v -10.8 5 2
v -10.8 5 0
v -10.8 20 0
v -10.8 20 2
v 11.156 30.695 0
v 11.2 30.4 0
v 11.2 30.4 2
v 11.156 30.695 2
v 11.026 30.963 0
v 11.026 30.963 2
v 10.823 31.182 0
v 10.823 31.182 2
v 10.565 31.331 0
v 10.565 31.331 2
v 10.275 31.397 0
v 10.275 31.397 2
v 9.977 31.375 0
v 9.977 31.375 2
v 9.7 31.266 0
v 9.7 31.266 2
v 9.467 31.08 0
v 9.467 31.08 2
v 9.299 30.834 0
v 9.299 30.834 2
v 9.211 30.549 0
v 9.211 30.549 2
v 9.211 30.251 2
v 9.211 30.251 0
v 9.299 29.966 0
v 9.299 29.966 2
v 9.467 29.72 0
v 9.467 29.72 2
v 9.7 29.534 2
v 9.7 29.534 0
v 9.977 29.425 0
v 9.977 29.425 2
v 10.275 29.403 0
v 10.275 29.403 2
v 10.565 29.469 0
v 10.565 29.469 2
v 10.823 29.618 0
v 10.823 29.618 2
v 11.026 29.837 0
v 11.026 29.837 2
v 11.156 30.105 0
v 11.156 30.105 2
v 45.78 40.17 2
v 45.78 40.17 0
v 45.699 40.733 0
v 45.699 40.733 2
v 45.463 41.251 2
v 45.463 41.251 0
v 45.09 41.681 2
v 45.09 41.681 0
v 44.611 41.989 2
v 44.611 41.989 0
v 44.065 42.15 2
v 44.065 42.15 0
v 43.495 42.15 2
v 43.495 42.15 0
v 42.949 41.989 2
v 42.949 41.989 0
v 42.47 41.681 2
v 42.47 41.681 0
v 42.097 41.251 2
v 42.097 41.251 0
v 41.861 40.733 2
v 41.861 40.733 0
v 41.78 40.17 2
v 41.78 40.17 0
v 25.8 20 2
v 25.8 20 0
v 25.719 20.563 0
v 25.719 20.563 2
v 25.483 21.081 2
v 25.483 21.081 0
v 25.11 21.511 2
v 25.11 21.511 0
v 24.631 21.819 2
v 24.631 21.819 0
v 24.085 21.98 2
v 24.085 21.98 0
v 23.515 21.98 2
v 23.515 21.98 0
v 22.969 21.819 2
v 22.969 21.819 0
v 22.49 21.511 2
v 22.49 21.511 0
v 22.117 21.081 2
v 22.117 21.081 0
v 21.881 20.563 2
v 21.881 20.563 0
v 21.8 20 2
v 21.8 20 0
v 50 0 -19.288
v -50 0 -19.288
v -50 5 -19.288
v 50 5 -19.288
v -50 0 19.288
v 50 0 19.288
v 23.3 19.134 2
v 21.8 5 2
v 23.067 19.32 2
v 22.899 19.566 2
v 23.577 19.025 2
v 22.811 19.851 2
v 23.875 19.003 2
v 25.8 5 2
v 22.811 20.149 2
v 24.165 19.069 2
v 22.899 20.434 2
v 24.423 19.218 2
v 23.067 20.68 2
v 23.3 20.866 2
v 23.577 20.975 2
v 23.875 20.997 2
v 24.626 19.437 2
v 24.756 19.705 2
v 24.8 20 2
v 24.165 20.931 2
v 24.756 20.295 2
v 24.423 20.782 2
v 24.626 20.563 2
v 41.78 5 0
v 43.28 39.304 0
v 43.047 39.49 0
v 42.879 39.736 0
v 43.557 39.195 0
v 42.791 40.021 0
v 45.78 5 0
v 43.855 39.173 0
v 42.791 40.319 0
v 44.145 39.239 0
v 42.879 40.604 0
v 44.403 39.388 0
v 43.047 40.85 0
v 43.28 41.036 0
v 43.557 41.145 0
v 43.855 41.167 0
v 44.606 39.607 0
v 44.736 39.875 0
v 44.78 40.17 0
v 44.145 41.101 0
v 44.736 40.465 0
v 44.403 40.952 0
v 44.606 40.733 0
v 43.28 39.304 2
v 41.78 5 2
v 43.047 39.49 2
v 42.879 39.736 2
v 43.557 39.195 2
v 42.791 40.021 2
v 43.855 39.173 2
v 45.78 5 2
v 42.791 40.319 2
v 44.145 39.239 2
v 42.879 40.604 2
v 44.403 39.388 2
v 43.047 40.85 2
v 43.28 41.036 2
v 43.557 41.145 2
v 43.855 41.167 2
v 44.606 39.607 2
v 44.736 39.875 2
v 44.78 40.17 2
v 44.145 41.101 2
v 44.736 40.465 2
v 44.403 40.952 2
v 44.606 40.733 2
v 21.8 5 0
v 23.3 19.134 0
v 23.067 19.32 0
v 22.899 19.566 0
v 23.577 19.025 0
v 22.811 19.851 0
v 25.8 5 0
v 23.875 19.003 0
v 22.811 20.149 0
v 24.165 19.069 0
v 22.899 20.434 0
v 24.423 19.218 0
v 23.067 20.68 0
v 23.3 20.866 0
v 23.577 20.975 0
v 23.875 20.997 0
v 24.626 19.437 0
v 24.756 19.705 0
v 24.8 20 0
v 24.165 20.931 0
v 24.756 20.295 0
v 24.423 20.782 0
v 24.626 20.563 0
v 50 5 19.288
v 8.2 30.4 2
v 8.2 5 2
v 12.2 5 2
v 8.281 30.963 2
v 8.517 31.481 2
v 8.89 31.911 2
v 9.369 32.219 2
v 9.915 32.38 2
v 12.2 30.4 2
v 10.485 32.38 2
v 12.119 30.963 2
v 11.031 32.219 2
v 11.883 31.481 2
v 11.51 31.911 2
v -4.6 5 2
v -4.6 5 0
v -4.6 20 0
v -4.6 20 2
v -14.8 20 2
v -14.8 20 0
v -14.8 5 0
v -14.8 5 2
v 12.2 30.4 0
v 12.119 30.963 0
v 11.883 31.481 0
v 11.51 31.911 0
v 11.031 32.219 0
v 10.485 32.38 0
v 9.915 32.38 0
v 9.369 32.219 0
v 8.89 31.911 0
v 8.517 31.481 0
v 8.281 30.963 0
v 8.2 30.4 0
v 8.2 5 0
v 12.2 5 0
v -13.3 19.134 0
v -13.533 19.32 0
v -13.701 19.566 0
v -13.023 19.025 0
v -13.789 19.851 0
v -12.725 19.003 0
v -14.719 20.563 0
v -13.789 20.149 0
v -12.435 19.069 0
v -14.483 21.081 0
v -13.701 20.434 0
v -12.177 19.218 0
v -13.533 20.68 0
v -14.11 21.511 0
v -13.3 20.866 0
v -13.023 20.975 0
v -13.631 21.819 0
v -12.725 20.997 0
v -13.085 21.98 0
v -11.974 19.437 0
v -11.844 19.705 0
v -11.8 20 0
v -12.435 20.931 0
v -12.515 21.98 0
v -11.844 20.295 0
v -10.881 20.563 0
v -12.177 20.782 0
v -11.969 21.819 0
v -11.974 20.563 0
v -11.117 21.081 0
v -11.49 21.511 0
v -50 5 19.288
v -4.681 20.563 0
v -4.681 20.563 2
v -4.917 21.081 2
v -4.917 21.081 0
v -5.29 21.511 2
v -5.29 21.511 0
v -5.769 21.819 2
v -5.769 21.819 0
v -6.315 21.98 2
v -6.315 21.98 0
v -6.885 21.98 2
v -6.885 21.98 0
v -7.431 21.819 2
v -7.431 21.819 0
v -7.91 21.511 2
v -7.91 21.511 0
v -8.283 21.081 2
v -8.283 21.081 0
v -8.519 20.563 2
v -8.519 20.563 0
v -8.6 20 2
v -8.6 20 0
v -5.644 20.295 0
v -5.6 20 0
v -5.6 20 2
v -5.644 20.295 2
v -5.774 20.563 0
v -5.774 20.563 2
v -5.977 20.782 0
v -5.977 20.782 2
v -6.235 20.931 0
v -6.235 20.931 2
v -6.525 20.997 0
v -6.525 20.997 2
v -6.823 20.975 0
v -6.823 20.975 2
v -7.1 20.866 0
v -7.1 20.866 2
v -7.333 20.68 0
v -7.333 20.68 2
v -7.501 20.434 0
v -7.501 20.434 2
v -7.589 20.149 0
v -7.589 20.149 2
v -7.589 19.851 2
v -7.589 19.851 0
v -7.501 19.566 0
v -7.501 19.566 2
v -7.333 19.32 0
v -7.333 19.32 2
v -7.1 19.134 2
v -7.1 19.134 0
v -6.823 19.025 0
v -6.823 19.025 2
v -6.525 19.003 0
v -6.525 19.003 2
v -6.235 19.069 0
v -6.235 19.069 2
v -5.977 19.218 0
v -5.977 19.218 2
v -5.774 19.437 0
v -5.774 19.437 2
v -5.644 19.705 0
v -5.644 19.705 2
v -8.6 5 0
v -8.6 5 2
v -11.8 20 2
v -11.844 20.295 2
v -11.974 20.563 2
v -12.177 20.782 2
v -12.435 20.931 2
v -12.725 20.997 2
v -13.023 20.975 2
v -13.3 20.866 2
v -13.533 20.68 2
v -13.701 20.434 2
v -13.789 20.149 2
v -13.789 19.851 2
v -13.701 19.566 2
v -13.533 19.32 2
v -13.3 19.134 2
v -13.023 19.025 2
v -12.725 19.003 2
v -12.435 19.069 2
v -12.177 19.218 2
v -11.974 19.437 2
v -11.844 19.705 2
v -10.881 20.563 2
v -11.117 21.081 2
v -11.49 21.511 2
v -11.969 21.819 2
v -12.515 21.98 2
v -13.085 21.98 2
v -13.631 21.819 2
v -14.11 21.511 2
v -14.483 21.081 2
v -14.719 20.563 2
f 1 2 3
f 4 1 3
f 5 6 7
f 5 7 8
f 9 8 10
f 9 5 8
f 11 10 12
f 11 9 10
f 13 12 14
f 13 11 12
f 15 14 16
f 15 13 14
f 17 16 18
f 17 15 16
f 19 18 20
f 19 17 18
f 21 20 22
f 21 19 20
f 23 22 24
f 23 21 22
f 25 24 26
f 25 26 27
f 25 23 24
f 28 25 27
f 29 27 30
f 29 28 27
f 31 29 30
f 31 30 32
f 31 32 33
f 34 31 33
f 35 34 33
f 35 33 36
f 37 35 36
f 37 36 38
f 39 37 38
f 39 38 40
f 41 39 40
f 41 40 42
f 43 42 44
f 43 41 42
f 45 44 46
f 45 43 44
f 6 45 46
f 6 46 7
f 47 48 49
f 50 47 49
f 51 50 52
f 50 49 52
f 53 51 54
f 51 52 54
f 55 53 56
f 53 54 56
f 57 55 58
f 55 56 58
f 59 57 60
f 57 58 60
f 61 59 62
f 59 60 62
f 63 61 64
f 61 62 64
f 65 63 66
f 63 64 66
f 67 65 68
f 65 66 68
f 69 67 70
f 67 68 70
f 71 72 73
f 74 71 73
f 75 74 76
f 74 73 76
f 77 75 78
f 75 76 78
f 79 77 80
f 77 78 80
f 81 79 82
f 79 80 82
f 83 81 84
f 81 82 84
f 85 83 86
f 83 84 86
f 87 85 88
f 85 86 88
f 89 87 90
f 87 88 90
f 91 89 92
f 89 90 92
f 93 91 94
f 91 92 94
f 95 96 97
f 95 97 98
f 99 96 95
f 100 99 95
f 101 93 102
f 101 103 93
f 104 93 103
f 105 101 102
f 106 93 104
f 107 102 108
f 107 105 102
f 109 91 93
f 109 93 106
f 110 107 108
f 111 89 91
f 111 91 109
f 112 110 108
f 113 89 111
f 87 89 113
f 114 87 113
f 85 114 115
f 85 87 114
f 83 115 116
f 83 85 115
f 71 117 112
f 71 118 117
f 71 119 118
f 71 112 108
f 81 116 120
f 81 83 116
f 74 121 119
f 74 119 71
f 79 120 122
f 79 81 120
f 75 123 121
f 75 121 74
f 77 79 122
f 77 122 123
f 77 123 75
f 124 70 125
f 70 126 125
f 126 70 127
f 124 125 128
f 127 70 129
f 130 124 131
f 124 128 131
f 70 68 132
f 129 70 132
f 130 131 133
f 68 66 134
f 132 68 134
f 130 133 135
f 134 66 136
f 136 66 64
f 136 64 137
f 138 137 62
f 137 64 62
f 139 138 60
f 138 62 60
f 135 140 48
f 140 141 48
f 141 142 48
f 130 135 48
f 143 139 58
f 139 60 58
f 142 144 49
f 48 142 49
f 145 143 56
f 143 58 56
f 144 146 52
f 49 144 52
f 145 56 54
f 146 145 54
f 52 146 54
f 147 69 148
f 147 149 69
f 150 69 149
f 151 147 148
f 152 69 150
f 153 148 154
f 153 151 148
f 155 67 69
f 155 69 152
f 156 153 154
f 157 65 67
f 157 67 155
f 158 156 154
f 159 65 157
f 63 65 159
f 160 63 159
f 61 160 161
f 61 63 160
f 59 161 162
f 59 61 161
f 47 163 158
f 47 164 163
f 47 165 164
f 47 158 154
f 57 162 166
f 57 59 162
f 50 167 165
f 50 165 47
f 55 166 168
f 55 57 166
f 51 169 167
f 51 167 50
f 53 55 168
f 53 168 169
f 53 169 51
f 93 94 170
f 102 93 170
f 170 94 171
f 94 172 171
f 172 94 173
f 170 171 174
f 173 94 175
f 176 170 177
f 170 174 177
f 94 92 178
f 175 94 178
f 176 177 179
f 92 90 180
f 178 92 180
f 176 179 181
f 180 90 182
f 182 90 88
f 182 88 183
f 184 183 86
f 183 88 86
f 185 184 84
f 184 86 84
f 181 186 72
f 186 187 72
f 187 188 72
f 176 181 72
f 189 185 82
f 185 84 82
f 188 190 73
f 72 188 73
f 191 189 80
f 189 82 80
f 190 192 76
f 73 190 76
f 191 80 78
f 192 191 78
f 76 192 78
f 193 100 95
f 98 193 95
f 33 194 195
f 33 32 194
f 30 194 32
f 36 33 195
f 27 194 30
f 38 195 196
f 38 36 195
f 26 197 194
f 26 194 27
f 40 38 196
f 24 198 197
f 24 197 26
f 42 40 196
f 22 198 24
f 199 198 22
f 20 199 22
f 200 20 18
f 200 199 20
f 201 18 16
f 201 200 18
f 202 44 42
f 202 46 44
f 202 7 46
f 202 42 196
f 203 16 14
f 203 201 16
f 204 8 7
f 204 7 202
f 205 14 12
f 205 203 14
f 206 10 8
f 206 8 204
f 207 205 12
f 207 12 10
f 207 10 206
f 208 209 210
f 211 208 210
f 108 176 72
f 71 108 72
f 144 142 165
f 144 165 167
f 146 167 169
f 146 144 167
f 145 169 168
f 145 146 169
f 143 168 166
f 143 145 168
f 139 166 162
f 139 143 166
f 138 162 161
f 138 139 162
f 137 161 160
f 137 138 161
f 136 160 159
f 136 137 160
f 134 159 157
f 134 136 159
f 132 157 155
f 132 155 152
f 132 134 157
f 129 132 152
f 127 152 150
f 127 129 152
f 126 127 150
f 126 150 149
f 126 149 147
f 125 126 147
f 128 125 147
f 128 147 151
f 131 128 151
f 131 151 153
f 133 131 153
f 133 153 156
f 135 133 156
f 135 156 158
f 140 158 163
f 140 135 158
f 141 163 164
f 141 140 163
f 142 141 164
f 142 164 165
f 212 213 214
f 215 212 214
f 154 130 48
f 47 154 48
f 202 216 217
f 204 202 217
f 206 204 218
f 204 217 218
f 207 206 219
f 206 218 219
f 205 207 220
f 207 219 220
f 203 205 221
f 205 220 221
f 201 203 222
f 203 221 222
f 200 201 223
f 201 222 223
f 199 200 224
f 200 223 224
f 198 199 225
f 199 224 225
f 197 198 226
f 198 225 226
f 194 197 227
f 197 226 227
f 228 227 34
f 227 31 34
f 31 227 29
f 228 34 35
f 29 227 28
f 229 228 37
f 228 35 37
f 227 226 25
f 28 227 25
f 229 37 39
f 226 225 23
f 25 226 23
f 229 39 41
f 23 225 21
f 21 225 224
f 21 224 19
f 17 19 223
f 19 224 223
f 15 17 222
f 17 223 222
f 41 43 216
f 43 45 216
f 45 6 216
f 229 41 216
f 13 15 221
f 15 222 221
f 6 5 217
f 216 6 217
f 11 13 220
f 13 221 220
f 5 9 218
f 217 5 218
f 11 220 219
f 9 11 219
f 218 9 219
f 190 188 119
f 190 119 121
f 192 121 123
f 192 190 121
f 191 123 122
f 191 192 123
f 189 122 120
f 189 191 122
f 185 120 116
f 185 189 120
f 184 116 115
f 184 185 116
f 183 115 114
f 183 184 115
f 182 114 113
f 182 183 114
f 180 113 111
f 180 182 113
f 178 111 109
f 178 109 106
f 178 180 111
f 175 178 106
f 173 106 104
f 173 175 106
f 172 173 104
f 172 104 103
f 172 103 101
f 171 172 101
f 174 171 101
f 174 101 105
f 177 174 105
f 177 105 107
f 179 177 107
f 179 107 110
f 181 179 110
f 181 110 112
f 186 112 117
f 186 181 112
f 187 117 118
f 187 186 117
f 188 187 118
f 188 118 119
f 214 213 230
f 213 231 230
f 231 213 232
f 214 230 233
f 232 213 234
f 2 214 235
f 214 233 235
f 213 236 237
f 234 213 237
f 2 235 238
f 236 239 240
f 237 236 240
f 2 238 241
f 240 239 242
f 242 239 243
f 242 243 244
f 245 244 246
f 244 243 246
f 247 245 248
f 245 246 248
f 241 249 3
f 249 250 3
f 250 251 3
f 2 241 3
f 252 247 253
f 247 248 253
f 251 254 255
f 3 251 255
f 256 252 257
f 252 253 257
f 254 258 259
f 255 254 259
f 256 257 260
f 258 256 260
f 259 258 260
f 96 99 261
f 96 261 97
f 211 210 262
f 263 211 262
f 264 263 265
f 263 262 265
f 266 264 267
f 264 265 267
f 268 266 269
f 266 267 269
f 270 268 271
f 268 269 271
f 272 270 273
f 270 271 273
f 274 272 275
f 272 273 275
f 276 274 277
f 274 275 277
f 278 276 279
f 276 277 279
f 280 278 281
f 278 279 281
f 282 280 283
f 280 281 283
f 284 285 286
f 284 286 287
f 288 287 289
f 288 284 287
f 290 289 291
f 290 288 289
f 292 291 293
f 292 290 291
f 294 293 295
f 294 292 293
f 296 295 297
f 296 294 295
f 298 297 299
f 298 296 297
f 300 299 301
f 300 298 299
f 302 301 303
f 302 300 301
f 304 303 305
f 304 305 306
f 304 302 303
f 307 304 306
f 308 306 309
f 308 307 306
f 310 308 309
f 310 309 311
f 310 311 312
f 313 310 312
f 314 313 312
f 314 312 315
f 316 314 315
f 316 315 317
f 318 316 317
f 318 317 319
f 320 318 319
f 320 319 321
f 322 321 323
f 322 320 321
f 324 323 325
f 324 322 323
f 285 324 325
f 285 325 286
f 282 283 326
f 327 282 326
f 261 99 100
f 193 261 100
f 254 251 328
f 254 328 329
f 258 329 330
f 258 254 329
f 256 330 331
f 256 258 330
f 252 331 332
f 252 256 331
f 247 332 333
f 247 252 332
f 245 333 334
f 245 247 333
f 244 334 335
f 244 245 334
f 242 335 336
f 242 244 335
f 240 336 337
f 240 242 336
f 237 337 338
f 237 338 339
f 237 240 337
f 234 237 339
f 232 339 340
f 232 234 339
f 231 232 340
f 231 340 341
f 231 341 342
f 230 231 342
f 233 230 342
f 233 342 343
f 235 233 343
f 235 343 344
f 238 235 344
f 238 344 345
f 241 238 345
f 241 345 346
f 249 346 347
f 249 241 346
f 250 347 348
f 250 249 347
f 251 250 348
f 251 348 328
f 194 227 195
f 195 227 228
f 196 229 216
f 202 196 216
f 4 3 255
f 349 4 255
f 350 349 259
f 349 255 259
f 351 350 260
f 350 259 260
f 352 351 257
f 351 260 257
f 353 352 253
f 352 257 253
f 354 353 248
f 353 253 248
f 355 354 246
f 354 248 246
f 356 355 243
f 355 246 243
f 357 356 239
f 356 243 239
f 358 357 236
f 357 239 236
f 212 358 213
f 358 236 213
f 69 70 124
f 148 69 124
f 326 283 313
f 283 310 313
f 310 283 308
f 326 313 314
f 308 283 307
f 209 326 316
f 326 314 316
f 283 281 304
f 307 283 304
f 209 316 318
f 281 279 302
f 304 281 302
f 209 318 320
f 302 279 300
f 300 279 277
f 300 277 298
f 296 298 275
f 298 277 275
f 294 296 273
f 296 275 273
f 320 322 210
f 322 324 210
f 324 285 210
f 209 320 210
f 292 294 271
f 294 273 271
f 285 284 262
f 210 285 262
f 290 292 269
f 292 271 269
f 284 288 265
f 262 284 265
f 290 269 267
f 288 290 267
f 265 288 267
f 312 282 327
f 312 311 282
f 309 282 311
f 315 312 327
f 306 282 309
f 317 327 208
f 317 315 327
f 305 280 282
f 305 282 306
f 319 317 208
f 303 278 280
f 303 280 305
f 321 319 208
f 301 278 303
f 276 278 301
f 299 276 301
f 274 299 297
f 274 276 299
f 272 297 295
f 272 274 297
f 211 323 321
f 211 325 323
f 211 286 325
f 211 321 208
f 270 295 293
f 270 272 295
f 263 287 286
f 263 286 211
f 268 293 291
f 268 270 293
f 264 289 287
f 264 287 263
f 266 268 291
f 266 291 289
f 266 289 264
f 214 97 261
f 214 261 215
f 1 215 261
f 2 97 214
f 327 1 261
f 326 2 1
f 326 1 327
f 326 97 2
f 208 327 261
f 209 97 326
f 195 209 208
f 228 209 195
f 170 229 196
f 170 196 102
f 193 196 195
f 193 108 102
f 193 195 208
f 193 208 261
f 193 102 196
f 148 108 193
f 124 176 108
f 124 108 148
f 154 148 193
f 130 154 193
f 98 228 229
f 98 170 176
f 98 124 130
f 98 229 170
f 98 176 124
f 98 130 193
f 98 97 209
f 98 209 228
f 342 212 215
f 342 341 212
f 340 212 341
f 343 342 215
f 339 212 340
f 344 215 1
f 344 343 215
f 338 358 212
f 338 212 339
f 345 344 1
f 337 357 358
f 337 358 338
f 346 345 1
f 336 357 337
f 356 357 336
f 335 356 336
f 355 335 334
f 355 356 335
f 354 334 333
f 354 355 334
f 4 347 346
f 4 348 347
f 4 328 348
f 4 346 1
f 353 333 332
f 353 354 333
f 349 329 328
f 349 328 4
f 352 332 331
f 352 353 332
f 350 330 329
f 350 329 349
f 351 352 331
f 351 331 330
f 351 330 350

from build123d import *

# Parameters (mm, degrees)
SKETCH_1_W      = 100
SKETCH_1_H      = 38.575985264
EXTRUDE_1_DEPTH = 5
SKETCH_2_R      = 1
EXTRUDE_2_DEPTH = 2


with BuildPart() as part:
    # 草圖1 → 填料-伸長1 (new body)
    with BuildSketch(Plane(origin=(0, 0, 0), x_dir=(1, 0, 0), z_dir=(0, 1, 0))):
        Rectangle(SKETCH_1_W, SKETCH_1_H)
    extrude(amount=EXTRUDE_1_DEPTH)

    # 草圖2 → 填料-伸長2 (add)
    # profile 1 of 5: a face of its own
    with BuildSketch(Plane.XY):
        with BuildLine():
            Line((-8.6, 20), (-8.6, 0))
            Line((-8.6, 0), (-4.6, 0))
            Line((-4.6, 0), (-4.6, 20))
            ThreePointArc((-4.6, 20), (-6.6, 22), (-8.6, 20))
        make_face()
        with Locations((-6.6, 20)):
            Circle(SKETCH_2_R, mode=Mode.SUBTRACT)
    # profile 2 of 5: a face of its own
    with BuildSketch(Plane.XY):
        with BuildLine():
            Line((-14.8, 20), (-14.8, 0))
            Line((-14.8, 0), (-10.8, 0))
            Line((-10.8, 0), (-10.8, 20))
            ThreePointArc((-10.8, 20), (-12.8, 22), (-14.8, 20))
        make_face()
        with Locations((-12.8, 20)):
            Circle(SKETCH_2_R, mode=Mode.SUBTRACT)
    # profile 3 of 5: a face of its own
    with BuildSketch(Plane.XY):
        with BuildLine():
            Line((21.8, 20), (21.8, 0))
            Line((21.8, 0), (25.8, 0))
            Line((25.8, 0), (25.8, 20))
            ThreePointArc((25.8, 20), (23.8, 22), (21.8, 20))
        make_face()
        with Locations((23.8, 20)):
            Circle(SKETCH_2_R, mode=Mode.SUBTRACT)
    # profile 4 of 5: a face of its own
    with BuildSketch(Plane.XY):
        with BuildLine():
            Line((8.2, 30.4), (8.2, 0))
            Line((8.2, 0), (12.2, 0))
            Line((12.2, 0), (12.2, 30.4))
            ThreePointArc((12.2, 30.4), (10.2, 32.4), (8.2, 30.4))
        make_face()
        with Locations((10.2, 30.4)):
            Circle(SKETCH_2_R, mode=Mode.SUBTRACT)
    # profile 5 of 5: a face of its own
    with BuildSketch(Plane.XY):
        with BuildLine():
            Line((41.78, 40.17), (41.78, 0))
            Line((41.78, 0), (45.78, 0))
            Line((45.78, 0), (45.78, 40.17))
            ThreePointArc((45.78, 40.17), (43.78, 42.17), (41.78, 40.17))
        make_face()
        with Locations((43.78, 40.17)):
            Circle(SKETCH_2_R, mode=Mode.SUBTRACT)
    extrude(amount=EXTRUDE_2_DEPTH)


solid = part.part
